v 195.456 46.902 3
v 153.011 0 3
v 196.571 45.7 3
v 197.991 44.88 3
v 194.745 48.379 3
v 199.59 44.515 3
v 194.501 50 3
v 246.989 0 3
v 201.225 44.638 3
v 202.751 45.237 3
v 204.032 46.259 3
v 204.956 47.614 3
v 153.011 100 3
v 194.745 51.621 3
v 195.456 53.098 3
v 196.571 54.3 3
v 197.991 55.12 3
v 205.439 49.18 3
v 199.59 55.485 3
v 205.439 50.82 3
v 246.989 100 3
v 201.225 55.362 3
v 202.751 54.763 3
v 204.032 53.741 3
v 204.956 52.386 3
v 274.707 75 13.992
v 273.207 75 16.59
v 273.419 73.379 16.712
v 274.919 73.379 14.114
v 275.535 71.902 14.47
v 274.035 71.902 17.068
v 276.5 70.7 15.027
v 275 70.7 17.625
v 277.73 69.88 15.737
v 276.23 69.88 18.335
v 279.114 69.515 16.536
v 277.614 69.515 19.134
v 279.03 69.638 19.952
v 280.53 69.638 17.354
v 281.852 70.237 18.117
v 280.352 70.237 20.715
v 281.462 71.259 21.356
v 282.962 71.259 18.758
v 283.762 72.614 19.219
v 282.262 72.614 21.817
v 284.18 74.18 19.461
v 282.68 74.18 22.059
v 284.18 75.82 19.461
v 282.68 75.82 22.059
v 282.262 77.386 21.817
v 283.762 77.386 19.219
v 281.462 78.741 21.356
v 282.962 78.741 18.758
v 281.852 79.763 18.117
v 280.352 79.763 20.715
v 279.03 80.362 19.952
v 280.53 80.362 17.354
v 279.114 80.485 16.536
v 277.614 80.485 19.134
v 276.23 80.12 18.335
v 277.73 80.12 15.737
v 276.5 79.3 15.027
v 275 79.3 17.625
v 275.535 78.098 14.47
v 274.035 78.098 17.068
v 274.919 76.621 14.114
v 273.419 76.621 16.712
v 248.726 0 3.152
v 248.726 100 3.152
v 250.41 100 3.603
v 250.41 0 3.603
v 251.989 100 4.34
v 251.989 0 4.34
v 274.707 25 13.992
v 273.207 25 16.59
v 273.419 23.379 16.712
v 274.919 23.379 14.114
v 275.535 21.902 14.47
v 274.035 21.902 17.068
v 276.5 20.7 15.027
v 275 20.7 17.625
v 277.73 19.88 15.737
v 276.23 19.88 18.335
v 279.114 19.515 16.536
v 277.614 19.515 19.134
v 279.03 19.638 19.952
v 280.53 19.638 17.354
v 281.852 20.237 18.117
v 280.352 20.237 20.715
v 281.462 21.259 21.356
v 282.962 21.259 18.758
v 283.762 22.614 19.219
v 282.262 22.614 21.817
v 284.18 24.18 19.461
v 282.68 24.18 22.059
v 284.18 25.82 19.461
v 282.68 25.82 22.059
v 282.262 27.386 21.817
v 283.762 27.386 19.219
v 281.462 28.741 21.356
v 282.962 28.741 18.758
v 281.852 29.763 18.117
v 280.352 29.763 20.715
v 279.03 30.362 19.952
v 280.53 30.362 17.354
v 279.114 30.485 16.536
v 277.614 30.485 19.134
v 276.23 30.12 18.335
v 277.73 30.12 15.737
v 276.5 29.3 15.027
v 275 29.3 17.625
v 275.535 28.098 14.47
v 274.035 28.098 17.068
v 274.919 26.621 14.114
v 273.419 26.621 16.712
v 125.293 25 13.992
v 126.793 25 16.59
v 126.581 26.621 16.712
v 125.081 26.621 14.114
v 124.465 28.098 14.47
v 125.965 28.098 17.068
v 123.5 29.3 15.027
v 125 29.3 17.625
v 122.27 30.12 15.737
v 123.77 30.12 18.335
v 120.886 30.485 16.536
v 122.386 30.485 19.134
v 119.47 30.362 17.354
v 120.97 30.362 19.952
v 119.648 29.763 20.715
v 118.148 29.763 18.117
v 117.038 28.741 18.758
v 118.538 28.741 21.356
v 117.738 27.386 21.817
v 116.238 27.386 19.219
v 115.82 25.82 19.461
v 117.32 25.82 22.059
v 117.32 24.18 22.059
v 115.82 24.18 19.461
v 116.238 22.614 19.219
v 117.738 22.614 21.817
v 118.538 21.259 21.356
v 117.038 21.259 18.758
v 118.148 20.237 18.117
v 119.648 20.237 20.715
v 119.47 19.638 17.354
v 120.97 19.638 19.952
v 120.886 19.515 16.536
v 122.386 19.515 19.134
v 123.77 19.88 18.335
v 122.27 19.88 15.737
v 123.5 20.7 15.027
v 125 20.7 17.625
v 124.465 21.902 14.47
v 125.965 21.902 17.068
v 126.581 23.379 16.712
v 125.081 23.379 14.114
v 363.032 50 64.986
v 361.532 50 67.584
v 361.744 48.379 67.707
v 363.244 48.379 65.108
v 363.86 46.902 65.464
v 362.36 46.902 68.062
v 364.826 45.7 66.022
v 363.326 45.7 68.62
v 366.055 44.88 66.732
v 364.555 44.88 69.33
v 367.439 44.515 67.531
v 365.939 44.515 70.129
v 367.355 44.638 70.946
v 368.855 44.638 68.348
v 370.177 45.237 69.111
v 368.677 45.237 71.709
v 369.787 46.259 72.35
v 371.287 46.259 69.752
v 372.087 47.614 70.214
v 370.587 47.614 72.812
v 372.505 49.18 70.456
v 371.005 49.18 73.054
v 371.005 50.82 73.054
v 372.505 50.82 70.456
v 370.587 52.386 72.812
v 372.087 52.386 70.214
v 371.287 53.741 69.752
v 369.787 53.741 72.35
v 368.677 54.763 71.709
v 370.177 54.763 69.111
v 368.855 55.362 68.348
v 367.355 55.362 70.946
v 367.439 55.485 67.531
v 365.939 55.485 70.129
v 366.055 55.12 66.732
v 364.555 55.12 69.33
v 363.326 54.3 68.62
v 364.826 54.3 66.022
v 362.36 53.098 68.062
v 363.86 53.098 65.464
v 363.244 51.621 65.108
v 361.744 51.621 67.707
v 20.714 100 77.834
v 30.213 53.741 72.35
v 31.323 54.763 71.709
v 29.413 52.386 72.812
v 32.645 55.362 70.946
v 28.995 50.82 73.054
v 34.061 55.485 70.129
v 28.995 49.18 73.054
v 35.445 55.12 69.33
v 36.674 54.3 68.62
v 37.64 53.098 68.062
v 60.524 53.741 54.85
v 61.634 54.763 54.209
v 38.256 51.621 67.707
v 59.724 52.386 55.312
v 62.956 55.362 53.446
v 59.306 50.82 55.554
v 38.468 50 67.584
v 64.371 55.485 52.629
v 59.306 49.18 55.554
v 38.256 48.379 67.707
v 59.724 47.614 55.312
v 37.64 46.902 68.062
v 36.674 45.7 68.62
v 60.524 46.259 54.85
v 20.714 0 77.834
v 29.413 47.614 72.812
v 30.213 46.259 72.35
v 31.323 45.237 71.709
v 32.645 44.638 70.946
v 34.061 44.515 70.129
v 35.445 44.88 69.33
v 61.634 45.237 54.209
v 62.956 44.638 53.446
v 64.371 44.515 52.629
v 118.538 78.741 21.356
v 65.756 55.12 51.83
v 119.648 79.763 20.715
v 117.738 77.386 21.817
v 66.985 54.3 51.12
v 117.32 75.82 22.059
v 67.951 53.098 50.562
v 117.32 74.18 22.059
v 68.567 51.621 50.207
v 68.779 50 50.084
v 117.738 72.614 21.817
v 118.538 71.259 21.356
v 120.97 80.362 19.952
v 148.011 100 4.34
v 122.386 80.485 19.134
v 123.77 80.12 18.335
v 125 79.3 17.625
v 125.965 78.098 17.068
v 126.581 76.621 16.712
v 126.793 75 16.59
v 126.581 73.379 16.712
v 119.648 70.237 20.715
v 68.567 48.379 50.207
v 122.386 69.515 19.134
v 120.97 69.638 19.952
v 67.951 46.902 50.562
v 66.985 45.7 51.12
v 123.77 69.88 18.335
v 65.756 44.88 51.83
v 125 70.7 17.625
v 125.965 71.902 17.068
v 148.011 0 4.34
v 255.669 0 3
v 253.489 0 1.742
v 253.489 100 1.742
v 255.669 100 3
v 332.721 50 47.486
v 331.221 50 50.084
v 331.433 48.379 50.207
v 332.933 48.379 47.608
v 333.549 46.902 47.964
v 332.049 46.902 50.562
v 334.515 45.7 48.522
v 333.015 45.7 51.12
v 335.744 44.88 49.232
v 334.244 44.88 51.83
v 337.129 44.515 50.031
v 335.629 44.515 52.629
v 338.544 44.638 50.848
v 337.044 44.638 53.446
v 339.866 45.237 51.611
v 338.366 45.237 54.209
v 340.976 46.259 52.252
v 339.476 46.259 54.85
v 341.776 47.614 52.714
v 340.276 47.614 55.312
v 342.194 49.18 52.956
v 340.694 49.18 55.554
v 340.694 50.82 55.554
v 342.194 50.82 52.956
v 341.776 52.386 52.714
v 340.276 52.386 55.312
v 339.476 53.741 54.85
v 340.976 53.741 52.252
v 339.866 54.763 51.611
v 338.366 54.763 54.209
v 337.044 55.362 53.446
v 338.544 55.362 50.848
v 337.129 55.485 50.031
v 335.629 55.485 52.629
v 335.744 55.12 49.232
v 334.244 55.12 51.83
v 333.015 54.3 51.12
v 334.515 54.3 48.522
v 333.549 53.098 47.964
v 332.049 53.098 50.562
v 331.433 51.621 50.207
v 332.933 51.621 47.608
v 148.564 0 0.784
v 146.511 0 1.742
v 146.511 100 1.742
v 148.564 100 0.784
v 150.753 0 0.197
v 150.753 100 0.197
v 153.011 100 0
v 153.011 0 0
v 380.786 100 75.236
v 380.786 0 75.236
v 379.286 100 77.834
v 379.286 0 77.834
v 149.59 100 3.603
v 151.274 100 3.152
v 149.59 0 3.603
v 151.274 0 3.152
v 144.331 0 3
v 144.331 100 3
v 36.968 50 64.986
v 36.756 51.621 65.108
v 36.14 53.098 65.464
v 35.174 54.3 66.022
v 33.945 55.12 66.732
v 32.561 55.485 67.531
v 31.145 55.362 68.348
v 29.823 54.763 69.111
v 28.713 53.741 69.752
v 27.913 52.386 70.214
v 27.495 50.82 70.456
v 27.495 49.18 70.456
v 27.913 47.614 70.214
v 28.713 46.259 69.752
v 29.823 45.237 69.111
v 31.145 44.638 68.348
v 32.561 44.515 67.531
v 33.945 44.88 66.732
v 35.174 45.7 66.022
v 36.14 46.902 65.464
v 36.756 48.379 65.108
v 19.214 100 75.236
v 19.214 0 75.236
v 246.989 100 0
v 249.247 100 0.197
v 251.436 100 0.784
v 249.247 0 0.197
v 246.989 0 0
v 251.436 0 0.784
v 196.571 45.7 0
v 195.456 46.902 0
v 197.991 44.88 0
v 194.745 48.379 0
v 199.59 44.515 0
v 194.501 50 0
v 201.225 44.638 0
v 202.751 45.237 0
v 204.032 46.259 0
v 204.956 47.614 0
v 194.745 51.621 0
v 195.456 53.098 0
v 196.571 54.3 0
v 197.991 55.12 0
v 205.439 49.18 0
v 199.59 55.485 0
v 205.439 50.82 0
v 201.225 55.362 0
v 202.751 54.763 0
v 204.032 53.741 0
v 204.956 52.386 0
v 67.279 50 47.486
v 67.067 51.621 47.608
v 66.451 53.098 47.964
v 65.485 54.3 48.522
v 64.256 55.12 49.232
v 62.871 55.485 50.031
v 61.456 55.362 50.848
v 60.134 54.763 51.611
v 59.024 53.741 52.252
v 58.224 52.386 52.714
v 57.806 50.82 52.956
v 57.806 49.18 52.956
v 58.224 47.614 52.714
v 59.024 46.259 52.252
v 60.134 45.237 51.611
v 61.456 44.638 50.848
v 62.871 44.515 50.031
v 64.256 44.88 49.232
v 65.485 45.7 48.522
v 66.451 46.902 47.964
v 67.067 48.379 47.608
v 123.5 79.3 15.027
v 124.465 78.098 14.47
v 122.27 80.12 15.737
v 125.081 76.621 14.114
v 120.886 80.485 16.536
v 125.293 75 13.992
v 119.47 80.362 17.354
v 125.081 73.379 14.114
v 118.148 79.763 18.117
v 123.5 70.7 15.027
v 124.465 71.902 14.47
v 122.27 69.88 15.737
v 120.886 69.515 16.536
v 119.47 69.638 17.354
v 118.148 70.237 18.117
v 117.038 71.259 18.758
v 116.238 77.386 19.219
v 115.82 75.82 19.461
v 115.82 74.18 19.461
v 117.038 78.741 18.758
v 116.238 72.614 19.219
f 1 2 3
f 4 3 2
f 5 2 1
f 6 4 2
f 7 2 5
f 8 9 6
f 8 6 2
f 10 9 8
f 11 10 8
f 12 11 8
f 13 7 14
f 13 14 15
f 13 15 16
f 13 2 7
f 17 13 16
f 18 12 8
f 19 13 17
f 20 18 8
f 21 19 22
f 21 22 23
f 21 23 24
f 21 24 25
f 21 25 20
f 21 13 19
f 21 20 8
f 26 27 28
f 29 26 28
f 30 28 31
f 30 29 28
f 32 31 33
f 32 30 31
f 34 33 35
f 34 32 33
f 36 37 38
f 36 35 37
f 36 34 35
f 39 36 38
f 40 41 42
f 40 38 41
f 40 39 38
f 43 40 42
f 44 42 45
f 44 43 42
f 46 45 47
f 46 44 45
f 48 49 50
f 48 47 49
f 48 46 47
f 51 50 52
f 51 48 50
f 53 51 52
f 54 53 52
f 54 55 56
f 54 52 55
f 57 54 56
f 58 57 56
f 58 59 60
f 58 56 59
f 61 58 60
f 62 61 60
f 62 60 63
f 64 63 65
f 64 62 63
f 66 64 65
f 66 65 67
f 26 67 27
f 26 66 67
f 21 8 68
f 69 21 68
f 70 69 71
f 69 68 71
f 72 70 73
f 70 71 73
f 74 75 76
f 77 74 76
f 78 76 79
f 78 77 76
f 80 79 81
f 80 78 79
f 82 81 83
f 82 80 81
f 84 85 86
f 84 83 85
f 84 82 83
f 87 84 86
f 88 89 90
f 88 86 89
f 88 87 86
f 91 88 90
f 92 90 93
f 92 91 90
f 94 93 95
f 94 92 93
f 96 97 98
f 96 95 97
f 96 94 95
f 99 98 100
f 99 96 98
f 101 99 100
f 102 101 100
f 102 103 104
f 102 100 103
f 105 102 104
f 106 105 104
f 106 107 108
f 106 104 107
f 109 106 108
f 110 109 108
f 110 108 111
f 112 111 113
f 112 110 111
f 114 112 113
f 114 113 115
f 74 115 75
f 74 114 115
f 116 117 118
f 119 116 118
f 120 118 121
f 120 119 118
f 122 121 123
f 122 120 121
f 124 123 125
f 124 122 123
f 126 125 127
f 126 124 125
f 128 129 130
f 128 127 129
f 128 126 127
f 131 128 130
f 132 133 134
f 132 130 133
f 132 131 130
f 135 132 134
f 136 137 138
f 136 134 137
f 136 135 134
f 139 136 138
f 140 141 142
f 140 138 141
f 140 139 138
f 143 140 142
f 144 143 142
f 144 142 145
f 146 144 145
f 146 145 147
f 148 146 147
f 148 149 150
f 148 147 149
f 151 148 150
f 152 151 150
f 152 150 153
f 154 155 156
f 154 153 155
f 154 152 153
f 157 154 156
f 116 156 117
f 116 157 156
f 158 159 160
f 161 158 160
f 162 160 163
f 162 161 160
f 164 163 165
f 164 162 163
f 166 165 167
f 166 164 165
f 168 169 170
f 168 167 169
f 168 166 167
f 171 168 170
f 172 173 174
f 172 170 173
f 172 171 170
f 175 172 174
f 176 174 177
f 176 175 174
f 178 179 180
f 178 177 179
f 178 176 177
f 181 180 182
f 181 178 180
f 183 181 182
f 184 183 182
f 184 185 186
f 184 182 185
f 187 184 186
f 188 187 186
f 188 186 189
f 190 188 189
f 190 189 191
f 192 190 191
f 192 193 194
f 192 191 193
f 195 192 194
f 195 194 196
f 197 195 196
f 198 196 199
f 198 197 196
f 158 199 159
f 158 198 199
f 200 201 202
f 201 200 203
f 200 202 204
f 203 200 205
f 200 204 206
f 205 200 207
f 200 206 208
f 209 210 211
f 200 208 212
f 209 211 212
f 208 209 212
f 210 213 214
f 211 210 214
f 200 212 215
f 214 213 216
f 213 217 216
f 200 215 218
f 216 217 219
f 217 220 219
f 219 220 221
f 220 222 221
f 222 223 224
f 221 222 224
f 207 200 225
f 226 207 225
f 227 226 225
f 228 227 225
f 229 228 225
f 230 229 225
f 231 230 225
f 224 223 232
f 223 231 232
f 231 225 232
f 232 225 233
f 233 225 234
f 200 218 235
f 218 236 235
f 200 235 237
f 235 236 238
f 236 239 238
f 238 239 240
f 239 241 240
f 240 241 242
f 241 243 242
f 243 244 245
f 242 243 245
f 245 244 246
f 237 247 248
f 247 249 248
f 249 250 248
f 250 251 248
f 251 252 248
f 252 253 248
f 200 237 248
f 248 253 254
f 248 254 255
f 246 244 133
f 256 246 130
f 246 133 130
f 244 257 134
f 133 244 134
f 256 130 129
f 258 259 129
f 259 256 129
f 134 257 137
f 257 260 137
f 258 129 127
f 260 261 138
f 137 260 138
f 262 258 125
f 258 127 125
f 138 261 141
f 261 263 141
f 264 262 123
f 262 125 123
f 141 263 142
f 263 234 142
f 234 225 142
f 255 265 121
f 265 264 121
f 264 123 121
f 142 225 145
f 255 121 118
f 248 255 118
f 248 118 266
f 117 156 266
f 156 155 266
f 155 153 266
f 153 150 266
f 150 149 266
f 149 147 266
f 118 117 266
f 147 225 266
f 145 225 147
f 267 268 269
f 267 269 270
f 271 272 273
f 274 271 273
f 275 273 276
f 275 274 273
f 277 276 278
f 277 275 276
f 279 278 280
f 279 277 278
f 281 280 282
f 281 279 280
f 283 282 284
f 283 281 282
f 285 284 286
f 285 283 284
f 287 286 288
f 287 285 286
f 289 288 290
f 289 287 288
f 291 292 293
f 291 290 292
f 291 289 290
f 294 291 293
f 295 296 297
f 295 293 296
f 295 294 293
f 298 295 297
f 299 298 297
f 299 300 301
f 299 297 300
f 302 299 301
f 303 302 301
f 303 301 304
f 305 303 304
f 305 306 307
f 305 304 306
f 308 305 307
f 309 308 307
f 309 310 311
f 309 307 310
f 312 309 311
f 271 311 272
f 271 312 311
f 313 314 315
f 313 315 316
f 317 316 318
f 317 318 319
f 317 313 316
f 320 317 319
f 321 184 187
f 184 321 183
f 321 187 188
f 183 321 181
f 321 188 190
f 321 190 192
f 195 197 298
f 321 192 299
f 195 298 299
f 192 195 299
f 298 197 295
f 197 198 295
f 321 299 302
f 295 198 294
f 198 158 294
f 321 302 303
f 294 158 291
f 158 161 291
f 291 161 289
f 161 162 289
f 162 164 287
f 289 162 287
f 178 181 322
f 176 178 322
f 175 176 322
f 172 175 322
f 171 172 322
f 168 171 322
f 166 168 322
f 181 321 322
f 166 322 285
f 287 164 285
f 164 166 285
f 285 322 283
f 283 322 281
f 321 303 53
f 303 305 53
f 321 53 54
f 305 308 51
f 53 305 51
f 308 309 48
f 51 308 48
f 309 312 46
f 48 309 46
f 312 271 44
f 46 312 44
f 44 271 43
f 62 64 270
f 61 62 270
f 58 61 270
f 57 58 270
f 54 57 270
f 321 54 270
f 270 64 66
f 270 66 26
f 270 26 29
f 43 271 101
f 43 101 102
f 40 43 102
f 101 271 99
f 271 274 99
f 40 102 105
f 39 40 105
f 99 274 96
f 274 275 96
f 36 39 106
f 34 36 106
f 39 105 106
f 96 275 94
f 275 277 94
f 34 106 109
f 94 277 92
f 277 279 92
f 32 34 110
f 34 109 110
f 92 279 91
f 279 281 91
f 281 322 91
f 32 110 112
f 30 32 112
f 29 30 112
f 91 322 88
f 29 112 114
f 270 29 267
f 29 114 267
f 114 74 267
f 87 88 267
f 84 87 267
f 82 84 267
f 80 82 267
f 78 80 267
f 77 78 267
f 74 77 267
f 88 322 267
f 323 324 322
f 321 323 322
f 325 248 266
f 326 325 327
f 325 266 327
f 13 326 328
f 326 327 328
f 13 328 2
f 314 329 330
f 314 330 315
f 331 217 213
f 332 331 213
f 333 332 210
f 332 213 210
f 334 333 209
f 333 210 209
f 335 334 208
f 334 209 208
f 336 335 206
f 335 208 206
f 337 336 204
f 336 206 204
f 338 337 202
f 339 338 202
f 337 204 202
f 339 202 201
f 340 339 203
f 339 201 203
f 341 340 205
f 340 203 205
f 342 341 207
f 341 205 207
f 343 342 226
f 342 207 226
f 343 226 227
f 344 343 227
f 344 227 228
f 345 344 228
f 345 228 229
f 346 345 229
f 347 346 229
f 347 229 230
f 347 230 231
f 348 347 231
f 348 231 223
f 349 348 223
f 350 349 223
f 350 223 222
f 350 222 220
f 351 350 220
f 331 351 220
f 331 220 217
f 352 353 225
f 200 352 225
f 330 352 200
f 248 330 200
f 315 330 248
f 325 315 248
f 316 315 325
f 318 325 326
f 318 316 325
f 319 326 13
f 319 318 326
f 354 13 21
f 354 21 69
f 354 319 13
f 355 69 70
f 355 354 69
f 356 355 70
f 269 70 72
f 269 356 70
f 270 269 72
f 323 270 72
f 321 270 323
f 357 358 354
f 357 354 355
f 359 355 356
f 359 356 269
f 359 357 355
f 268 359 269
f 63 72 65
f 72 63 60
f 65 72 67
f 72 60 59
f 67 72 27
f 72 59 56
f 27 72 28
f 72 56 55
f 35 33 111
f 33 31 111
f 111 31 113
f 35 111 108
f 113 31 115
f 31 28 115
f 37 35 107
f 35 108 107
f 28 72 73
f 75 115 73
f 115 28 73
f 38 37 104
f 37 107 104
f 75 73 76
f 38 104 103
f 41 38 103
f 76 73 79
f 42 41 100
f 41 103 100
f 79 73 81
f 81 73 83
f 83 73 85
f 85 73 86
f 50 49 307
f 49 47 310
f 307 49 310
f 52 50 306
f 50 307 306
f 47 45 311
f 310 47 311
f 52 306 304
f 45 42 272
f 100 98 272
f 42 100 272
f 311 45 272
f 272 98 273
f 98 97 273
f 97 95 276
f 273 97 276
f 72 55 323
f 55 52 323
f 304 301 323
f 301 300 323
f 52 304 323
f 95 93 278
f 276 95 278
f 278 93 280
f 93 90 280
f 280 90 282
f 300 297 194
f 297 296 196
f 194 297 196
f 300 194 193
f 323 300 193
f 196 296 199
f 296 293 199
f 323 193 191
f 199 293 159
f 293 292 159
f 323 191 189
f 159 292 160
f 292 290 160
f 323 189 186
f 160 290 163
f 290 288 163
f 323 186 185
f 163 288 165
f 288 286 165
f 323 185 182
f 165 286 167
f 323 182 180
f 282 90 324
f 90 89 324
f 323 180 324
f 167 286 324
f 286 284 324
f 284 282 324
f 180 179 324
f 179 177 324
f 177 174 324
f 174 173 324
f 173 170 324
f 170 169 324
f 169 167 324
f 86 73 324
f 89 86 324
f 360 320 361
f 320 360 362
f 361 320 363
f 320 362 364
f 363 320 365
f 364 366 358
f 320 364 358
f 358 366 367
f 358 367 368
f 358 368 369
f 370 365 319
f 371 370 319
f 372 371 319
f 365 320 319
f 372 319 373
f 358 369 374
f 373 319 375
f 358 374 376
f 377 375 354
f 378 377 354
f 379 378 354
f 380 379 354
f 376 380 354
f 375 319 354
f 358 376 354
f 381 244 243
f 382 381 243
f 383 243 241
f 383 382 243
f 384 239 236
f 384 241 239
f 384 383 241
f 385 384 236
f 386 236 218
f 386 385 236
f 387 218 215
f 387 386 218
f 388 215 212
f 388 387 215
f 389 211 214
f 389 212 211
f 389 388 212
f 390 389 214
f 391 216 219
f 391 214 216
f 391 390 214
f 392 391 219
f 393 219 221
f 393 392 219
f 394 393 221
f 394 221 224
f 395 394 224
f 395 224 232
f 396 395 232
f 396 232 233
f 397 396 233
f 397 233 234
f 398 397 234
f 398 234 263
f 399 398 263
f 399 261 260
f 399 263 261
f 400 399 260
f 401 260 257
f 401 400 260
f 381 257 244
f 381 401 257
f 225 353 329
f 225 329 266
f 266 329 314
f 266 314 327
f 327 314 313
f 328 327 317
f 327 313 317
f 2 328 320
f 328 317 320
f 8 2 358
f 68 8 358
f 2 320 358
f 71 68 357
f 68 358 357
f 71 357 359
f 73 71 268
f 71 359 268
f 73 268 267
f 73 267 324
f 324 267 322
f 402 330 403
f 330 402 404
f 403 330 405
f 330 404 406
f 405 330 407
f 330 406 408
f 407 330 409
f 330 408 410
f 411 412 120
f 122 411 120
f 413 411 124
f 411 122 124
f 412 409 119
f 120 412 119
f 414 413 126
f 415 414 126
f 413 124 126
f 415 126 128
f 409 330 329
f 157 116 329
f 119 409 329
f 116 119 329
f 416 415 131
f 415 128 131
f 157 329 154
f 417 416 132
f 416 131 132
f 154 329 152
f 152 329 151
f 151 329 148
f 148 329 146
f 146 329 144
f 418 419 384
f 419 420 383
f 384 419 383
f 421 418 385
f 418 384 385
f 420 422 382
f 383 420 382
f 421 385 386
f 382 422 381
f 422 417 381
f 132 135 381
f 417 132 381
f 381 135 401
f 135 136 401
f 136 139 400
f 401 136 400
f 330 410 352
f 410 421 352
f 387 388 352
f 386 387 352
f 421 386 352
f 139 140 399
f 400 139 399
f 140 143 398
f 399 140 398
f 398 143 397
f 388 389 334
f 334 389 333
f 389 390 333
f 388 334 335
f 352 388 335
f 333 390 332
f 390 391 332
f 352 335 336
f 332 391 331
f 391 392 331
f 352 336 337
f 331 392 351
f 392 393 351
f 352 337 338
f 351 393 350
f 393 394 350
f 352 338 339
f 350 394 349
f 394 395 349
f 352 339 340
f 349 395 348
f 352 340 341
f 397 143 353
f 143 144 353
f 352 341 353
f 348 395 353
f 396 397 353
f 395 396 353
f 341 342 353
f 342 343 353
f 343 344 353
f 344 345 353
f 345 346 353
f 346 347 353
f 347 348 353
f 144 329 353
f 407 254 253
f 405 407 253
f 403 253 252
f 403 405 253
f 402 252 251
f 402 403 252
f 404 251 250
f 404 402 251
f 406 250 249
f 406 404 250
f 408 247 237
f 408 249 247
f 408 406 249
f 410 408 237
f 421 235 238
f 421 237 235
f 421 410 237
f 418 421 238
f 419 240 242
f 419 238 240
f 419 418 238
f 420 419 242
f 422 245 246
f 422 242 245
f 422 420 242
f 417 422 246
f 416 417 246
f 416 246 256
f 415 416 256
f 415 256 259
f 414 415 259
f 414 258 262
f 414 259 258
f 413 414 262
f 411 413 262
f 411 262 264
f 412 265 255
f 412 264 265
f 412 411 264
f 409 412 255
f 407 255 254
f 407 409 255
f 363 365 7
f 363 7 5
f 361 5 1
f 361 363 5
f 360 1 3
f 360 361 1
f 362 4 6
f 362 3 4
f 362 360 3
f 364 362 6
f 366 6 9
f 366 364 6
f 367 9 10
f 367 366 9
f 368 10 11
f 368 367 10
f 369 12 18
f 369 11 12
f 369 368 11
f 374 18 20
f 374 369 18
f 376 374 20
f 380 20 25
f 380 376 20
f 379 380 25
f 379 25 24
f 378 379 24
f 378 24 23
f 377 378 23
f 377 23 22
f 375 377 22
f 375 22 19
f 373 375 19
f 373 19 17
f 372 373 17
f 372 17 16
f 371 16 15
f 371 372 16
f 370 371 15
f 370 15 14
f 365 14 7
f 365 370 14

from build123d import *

# Parameters (mm, degrees)
SZKIC1_W                        = 400
SZKIC1_H                        = 100
DODANIE_WYCI_GNI_CIE1_DEPTH     = 3
SZKIC_ZGI_CIA1_DEPTH            = 100
SZKIC_ZGI_CIA1_2_DEPTH          = 100
WYTNIJ_WYCI_GNI_CIE4_DEPTH      = 401.746800829
WYTNIJ_WYCI_GNI_CIE4_DEPTH_BACK = 401.746800829
SZKIC18_R                       = 5.5
WYTNIJ_WYCI_GNI_CIE5_DEPTH      = 383.009072614
WYTNIJ_WYCI_GNI_CIE5_DEPTH_BACK = 383.009072614
SZKIC19_R                       = 5.5
WYTNIJ_WYCI_GNI_CIE6_DEPTH      = 363.537857428
WYTNIJ_WYCI_GNI_CIE6_DEPTH_BACK = 363.537857428
SZKIC20_R                       = 5.5
SZKIC21_R                       = 5.5
WYTNIJ_WYCI_GNI_CIE7_DEPTH      = 10


# Read off the part's stored shape, not the designer's step: Szkic zgięcia1
with BuildPart() as part:
    # Szkic1 → Dodanie-wyciągnięcie1 (new body)
    with BuildSketch(Plane.XY):
        with Locations((200, 50)):
            Rectangle(SZKIC1_W, SZKIC1_H)
    extrude(amount=DODANIE_WYCI_GNI_CIE1_DEPTH)

    # Szkic zgięcia1 outline → Szkic zgięcia1 (cut)
    with BuildSketch(Plane(origin=(0, 0, 0), x_dir=(1, 0, 0), z_dir=(0, 1, 0))):
        with BuildLine():
            Line((0, -3), (144.331201036, -3))
            Line((144.331201036, -3), (146.51069296, -1.741669751))
            ThreePointArc((146.51069296, -1.741669751), (149.646045374, -0.442964258), (153.01069296, 0))
            Line((153.01069296, 0), (0, 0))
            Line((0, 0), (0, -3))
        make_face()
        with BuildLine():
            Line((253.48930704, -1.741669751), (255.668798964, -3))
            Line((255.668798964, -3), (400, -3))
            Line((400, -3), (400, 0))
            Line((400, 0), (246.98930704, 0))
            ThreePointArc((246.98930704, 0), (250.353954626, -0.442964258), (253.48930704, -1.741669751))
        make_face()
    extrude(amount=SZKIC_ZGI_CIA1_DEPTH, mode=Mode.SUBTRACT)

    # Szkic zgi_cia1 2 outline → Szkic zgi_cia1 2 (add)
    with BuildSketch(Plane(origin=(0, 0, 0), x_dir=(1, 0, 0), z_dir=(0, 1, 0))):
        with BuildLine():
            Line((20.714218978, -77.834399482), (148.01069296, -4.339745962))
            ThreePointArc((148.01069296, -4.339745962), (150.422502509, -3.340741737), (153.01069296, -3))
            Line((153.01069296, -3), (144.331201036, -3))
            Line((144.331201036, -3), (19.214218978, -75.236323271))
            Line((19.214218978, -75.236323271), (20.714218978, -77.834399482))
        make_face()
        with BuildLine():
            Line((255.668798964, -3), (246.98930704, -3))
            ThreePointArc((246.98930704, -3), (249.577497491, -3.340741737), (251.98930704, -4.339745962))
            Line((251.98930704, -4.339745962), (379.285781022, -77.834399482))
            Line((379.285781022, -77.834399482), (380.785781022, -75.236323271))
            Line((380.785781022, -75.236323271), (255.668798964, -3))
        make_face()
    extrude(amount=SZKIC_ZGI_CIA1_2_DEPTH)

    # Szkic18 → Wytnij-wyciągnięcie4 (cut, two sides: drawn at the far end of the back side and taken through both)
    with BuildSketch(Plane.XY.offset(3).offset(-WYTNIJ_WYCI_GNI_CIE4_DEPTH_BACK)):
        with Locations(Location((200.00069296, 49.999999995, 0), (0, 0, 180))):
            Circle(SZKIC18_R)
    extrude(amount=WYTNIJ_WYCI_GNI_CIE4_DEPTH + WYTNIJ_WYCI_GNI_CIE4_DEPTH_BACK, mode=Mode.SUBTRACT)

    # Szkic19 → Wytnij-wyciągnięcie5 (cut, two sides: drawn at the far end of the back side and taken through both)
    with BuildSketch(Plane(origin=(61.118161635, 0, -105.859761218), x_dir=(0.8660254037844382, 0, 0.500000000000001), z_dir=(-0.500000000000001, 0, 0.8660254037844382)).offset(-WYTNIJ_WYCI_GNI_CIE5_DEPTH_BACK)):
        with Locations(Location((250.39901436, 75, 0), (0, 0, 180))):
            Circle(SZKIC19_R)
        with Locations(Location((250.39901436, 25, 0), (0, 0, 180))):
            Circle(SZKIC19_R)
        with Locations(Location((317.3883214, 50, 0), (0, 0, 180))):
            Circle(SZKIC19_R)
        with Locations(Location((352.3883214, 50, 0), (0, 0, 180))):
            Circle(SZKIC19_R)
    extrude(amount=WYTNIJ_WYCI_GNI_CIE5_DEPTH + WYTNIJ_WYCI_GNI_CIE5_DEPTH_BACK, mode=Mode.SUBTRACT)

    # Szkic20 → Wytnij-wyciągnięcie6 (cut, two sides: drawn at the far end of the back side and taken through both)
    with BuildSketch(Plane(origin=(38.881838365, 0, 67.345319539), x_dir=(0.8660254037844382, 0, -0.500000000000001), z_dir=(0.500000000000001, 0, 0.8660254037844382)).offset(-WYTNIJ_WYCI_GNI_CIE6_DEPTH_BACK)):
        with Locations((96.011147154, 75)):
            Circle(SZKIC20_R)
        with Locations((96.011147154, 25)):
            Circle(SZKIC20_R)
        with Locations((29.021840113, 50)):
            Circle(SZKIC20_R)
    extrude(amount=WYTNIJ_WYCI_GNI_CIE6_DEPTH + WYTNIJ_WYCI_GNI_CIE6_DEPTH_BACK, mode=Mode.SUBTRACT)

    # Szkic21 → Wytnij-wyciągnięcie7 (cut)
    with BuildSketch(Plane(origin=(38.881838365, 0, 67.345319539), x_dir=(0.8660254037844382, 0, -0.500000000000001), z_dir=(0.500000000000001, 0, 0.8660254037844382))):
        with Locations((-5.978159887, 50)):
            Circle(SZKIC21_R)
    extrude(amount=-WYTNIJ_WYCI_GNI_CIE7_DEPTH, mode=Mode.SUBTRACT)


solid = part.part
